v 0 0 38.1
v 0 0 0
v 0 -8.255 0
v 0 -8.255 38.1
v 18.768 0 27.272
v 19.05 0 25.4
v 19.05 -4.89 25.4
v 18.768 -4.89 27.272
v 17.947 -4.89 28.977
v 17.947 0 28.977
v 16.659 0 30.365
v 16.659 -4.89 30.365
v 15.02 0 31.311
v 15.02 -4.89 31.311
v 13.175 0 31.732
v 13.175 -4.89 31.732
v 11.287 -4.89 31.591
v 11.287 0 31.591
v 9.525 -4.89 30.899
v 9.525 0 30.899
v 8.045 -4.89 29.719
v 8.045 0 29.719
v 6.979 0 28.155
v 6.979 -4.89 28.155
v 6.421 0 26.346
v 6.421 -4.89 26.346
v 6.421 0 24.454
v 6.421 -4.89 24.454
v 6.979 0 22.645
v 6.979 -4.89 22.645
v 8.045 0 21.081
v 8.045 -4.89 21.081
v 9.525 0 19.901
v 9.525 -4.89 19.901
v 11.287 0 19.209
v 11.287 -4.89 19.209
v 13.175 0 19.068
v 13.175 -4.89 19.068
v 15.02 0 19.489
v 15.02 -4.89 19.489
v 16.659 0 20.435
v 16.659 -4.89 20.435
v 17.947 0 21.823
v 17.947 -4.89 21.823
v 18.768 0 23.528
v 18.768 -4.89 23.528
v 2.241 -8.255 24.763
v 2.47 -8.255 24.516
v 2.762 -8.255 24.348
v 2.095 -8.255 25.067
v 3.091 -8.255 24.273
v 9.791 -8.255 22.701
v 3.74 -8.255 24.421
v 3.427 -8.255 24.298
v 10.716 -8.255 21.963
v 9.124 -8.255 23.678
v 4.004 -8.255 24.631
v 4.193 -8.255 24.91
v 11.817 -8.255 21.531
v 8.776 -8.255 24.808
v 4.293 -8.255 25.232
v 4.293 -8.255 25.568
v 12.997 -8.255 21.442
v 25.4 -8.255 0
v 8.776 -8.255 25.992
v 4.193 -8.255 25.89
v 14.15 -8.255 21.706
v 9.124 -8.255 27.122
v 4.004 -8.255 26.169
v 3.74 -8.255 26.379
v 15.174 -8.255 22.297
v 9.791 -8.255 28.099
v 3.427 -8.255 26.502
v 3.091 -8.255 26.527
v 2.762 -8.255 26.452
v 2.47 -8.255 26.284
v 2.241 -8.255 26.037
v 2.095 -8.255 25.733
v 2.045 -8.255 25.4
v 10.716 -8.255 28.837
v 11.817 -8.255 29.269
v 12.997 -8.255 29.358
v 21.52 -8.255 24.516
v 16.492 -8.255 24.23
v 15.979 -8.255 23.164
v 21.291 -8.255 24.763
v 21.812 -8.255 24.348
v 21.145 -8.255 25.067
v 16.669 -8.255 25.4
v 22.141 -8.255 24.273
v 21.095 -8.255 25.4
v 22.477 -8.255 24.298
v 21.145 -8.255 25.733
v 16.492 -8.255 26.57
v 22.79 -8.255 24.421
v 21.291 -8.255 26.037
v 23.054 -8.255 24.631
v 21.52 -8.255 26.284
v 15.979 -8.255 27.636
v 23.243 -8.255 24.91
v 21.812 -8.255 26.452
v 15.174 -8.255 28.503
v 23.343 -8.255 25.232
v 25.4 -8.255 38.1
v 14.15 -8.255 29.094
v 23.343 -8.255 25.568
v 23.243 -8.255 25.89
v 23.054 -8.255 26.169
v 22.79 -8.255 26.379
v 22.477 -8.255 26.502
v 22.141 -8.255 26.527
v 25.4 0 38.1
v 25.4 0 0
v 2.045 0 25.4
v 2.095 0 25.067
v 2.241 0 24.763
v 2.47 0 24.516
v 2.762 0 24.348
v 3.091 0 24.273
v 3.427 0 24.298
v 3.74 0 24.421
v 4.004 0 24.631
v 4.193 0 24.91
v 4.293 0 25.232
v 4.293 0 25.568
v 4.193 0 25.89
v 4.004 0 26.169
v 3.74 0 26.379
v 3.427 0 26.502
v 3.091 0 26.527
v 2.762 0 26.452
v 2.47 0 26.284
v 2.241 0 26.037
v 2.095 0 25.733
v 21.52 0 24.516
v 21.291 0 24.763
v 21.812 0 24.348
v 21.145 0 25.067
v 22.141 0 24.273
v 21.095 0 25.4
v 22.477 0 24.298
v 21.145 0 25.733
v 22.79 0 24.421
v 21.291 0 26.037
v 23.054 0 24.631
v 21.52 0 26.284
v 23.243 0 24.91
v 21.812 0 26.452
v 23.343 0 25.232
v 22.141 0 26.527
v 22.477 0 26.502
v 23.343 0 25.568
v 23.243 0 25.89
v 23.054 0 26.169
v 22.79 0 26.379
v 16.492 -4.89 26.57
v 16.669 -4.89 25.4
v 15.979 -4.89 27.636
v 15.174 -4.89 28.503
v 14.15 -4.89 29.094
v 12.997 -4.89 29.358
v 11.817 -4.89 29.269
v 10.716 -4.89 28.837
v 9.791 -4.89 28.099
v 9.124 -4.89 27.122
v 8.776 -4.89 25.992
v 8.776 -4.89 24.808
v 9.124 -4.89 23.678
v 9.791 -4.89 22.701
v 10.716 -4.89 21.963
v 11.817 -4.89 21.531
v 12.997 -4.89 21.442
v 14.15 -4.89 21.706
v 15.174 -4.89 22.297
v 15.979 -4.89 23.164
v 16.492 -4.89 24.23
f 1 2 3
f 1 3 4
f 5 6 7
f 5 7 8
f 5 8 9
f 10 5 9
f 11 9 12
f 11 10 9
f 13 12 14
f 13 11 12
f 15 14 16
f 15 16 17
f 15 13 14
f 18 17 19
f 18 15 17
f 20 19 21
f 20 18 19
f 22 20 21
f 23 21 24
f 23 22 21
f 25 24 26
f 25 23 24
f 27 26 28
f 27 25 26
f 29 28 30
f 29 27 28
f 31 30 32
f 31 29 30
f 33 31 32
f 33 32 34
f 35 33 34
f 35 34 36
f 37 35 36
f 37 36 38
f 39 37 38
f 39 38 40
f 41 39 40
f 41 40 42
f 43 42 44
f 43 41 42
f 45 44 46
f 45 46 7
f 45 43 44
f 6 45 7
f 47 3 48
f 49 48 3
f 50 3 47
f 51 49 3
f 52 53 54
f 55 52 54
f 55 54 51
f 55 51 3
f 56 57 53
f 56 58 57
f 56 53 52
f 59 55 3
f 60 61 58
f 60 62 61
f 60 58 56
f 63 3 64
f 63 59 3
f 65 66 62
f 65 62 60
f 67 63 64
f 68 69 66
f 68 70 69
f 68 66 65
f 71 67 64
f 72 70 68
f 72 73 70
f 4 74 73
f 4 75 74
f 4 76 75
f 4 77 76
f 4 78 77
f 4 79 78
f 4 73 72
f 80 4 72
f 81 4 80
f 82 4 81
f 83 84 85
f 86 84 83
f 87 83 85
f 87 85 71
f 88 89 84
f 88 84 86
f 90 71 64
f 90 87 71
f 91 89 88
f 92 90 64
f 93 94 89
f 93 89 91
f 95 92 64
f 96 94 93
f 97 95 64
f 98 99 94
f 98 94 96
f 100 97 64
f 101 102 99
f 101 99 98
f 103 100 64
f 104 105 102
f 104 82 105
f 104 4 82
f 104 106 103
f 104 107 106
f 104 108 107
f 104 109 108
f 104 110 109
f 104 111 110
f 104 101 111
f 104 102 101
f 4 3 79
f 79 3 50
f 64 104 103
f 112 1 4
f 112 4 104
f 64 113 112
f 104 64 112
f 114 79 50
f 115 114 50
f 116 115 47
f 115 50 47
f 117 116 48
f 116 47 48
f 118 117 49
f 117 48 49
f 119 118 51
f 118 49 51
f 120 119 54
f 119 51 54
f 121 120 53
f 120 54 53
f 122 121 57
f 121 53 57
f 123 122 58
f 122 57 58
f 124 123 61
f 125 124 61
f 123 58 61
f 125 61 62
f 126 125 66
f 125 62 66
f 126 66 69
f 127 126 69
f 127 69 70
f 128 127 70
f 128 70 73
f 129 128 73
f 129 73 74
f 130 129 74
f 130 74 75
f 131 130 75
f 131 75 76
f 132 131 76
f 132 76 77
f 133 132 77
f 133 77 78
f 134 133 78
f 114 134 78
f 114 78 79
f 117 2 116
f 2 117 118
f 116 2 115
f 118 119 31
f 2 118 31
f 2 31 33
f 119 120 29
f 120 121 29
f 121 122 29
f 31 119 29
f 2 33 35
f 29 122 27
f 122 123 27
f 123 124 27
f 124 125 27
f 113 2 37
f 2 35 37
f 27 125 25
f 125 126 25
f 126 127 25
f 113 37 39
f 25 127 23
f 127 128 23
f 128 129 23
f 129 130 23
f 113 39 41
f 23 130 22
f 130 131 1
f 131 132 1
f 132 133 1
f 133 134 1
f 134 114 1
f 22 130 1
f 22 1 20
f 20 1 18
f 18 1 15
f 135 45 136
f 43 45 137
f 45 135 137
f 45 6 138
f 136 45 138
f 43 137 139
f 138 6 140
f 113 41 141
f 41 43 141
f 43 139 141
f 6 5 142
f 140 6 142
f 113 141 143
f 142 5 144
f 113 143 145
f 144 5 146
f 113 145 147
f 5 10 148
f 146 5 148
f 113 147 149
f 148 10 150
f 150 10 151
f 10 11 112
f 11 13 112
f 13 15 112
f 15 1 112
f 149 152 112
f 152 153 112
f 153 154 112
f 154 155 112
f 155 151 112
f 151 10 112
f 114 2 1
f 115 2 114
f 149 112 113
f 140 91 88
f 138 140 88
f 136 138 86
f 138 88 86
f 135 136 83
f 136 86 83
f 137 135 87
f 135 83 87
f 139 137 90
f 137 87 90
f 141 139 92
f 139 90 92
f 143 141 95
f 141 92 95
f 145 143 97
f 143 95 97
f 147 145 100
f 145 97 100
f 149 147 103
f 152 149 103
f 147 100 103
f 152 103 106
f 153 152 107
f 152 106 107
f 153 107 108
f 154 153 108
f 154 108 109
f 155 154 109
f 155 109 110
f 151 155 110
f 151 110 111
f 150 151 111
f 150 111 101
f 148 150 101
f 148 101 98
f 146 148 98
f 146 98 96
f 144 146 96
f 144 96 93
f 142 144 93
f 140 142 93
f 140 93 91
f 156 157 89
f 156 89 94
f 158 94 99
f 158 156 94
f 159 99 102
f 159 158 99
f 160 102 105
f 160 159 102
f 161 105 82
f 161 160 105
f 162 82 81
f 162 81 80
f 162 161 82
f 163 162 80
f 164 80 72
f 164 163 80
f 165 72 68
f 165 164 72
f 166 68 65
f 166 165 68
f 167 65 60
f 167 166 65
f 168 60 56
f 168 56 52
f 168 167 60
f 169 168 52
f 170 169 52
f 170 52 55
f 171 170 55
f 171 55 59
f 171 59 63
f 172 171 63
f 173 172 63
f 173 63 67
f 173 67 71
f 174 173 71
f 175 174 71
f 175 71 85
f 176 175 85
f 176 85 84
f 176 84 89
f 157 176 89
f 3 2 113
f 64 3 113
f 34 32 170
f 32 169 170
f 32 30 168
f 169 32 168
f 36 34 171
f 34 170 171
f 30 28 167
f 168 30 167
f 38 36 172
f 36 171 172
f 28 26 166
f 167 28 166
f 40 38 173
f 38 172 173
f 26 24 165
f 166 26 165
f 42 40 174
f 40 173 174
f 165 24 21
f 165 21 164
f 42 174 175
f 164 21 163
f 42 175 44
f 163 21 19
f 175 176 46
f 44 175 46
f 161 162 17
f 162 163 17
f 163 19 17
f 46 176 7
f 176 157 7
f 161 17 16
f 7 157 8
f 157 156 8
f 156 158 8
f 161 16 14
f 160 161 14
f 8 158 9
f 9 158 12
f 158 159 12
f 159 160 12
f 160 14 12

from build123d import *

# Parameters (mm, degrees)
F0_W     = 25.4
F0_H     = 38.1
F0_R     = 6.35
F0_R_2   = 3.96875
F1_DEPTH = 8.255
F2_DEPTH = 4.8895
F3_D     = 2.2606


with BuildPart() as f1:
    # F0 (on Front) → F1 (new body)
    with BuildSketch(Plane.XZ):
        with Locations((12.7, 19.05)):
            Rectangle(F0_W, F0_H)
        with Locations((12.7, 25.4)):
            Circle(F0_R, mode=Mode.SUBTRACT)
        with Locations((12.7, 25.4)):
            Circle(F0_R)
        with Locations((12.7, 25.4)):
            Circle(F0_R_2, mode=Mode.SUBTRACT)
    extrude(amount=F1_DEPTH)

    # F0 (on Front) → F2 (cut)
    with BuildSketch(Plane.XZ):
        with Locations((12.7, 25.4)):
            Circle(F0_R)
        with Locations((12.7, 25.4)):
            Circle(F0_R_2, mode=Mode.SUBTRACT)
    extrude(amount=F2_DEPTH, mode=Mode.SUBTRACT)

    # F3 (through all)
    with Locations(Plane(origin=(0, 0, 0), x_dir=(1, 0, 0), z_dir=(0, 1, 0))):
        with Locations((22.225, -25.4), (3.175, -25.4)):
            Hole(F3_D / 2)


solid = f1.part
